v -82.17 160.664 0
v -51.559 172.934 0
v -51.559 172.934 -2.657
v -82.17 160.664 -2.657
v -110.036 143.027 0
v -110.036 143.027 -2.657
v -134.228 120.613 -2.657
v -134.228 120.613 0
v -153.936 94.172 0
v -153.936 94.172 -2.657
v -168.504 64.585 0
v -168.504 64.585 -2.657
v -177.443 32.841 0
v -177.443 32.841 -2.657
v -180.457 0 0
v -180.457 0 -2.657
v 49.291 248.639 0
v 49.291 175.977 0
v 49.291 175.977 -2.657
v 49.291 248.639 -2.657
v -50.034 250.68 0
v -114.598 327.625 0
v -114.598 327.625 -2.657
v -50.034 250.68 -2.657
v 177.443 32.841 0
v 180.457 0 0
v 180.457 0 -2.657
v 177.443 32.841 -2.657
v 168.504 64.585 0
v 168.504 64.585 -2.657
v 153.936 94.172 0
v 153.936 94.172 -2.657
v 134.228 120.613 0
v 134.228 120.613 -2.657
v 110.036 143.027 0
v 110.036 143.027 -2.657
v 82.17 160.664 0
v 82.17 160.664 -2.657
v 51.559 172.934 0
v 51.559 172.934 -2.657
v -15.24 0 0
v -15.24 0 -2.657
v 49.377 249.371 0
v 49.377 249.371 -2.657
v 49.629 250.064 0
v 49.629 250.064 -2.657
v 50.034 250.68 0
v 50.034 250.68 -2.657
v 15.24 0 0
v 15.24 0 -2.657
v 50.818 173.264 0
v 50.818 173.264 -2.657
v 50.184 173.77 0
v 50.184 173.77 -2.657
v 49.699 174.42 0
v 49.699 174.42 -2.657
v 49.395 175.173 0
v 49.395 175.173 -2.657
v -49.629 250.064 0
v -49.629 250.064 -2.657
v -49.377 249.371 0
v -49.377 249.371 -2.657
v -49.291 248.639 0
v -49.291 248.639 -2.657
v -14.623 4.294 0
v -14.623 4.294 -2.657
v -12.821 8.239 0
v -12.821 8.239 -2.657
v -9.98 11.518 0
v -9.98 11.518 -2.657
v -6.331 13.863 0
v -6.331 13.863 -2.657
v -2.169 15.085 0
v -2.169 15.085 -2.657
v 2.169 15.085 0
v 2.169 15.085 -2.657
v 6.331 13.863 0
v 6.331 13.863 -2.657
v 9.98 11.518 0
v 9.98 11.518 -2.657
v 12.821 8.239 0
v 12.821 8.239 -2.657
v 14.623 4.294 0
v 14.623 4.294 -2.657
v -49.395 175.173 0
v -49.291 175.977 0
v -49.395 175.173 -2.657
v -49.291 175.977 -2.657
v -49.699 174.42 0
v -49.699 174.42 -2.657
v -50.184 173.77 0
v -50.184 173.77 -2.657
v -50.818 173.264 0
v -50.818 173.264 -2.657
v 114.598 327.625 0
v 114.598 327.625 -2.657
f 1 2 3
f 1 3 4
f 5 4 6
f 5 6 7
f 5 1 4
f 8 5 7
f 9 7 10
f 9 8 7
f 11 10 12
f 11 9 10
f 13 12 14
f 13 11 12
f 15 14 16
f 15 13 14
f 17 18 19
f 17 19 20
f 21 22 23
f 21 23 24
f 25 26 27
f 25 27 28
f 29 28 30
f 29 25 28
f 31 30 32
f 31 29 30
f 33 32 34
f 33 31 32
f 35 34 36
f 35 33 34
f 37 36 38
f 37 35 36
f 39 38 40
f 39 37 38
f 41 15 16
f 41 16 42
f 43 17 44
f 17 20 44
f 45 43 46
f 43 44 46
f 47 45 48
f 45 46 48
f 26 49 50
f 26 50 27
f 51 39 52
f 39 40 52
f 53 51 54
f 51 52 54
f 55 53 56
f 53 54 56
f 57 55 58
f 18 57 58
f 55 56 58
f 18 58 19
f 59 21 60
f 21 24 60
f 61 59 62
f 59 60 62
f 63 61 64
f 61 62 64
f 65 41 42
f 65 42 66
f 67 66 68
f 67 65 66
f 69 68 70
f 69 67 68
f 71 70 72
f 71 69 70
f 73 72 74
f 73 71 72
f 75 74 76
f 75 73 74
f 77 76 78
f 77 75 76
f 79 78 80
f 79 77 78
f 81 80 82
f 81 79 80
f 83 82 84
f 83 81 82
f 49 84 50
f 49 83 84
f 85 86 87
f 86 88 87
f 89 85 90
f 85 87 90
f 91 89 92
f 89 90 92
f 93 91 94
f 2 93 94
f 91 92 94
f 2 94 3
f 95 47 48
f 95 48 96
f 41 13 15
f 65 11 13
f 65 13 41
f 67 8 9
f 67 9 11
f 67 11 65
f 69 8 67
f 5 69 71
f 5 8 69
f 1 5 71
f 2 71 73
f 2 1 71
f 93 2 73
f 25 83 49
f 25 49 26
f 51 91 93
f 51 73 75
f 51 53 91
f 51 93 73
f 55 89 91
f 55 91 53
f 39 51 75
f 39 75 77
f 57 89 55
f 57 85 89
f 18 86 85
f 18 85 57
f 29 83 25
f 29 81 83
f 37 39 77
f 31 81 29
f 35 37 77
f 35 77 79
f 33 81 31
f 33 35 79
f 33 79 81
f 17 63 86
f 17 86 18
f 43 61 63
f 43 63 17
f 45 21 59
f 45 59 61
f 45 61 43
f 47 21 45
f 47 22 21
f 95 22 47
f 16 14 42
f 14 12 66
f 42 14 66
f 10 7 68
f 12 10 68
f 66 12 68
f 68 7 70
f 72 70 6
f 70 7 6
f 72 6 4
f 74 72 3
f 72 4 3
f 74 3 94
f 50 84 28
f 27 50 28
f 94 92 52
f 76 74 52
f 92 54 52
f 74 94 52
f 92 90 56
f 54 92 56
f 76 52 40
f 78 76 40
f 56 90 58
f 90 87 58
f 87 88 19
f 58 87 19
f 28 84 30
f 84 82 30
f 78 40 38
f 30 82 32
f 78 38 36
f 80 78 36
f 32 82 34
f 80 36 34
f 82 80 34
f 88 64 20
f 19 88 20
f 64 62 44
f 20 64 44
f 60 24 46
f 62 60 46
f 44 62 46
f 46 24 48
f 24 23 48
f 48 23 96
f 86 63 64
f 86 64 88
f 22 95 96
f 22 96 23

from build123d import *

# Parameters (mm, degrees)
BASE_FLANGE1_DEPTH = 2.65684
FILLET1_R          = 3.175


# Sheet-metal steps are written as plain solids
with BuildPart() as part:
    # Sketch1 → Base-Flange1 (new body)
    with BuildSketch(Plane.XY):
        with BuildLine():
            Line((-180.45684, 0), (-15.24, 0))
            ThreePointArc((-15.24, 0), (0, 15.24), (15.24, 0))
            Line((15.24, 0), (180.45684, 0))
            ThreePointArc((180.45684, 0), (143.97849234, 108.788165011), (49.29124, 173.594483674))
            Line((49.29124, 173.594483674), (49.29124, 249.794483674))
            Line((49.29124, 249.794483674), (114.598461144, 327.624599095))
            Line((114.598461144, 327.624599095), (-114.598461144, 327.624599095))
            Line((-114.598461144, 327.624599095), (-49.29124, 249.794483674))
            Line((-49.29124, 249.794483674), (-49.29124, 173.594483674))
            ThreePointArc((-49.29124, 173.594483674), (-143.97849234, 108.788165011), (-180.45684, 0))
        make_face()
    extrude(amount=-BASE_FLANGE1_DEPTH)

    # Fillet1
    fillet1_edges = [part.edges().sort_by_distance(p)[0] for p in [
        (-49.29124, 173.594483674, -1.32842),
        (-49.29124, 249.794483674, -1.32842),
        (49.29124, 249.794483674, -1.32842),
        (49.29124, 173.594483674, -1.32842),
    ]]
    fillet(fillet1_edges, radius=FILLET1_R)


solid = part.part
